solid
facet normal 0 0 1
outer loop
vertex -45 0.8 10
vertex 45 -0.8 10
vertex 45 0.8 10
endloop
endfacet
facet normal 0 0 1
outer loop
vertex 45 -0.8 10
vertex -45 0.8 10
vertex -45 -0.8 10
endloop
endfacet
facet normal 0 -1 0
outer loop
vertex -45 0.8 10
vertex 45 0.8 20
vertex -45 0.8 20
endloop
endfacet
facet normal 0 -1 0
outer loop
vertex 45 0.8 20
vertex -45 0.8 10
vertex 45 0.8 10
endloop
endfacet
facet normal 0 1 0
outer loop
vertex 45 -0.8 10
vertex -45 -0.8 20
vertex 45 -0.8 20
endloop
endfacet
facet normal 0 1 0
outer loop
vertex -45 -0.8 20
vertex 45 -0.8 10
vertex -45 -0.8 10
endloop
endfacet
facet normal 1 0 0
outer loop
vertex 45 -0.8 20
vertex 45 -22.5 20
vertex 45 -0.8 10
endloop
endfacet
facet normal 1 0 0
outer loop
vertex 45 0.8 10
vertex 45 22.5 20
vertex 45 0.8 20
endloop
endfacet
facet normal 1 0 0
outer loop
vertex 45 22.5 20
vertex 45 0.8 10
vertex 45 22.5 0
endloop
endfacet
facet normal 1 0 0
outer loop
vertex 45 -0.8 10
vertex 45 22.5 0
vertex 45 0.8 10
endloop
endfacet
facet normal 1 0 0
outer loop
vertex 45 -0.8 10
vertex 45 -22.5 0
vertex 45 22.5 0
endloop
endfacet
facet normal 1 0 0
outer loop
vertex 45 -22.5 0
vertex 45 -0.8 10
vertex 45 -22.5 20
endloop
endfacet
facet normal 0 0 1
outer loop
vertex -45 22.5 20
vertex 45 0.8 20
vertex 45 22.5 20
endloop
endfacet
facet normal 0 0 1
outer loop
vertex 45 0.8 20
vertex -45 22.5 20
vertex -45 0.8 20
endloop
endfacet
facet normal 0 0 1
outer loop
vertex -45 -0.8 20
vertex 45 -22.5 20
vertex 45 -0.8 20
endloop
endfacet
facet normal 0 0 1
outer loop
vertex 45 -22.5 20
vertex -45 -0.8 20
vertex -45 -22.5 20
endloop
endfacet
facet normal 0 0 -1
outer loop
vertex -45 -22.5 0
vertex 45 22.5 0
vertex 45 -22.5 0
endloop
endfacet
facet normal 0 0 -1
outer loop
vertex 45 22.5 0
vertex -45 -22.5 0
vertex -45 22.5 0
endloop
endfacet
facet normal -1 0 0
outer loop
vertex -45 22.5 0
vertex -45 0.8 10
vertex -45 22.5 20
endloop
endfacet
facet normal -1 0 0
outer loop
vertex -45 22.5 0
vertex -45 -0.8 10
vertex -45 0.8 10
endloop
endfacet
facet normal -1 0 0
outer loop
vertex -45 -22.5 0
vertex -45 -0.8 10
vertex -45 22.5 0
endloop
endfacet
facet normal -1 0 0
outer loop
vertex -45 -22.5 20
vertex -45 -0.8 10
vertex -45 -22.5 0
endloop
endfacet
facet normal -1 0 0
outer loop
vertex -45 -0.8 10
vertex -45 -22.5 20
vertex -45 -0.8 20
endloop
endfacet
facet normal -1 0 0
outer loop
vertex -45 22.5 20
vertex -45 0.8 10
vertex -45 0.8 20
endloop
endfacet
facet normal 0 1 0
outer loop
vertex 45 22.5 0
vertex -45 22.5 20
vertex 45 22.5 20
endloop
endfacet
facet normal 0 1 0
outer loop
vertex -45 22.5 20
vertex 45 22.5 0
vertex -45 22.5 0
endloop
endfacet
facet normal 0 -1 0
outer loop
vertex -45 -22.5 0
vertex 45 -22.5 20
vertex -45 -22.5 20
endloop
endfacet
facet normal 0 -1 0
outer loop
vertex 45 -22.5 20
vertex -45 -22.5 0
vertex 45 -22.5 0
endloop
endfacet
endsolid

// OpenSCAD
// Microscope slide drying rack
// Print orientation: base block on bed (z = 0), slots open upward (+Z)

// ---------------- Parameters ----------------
block_len    = 90;    // base block length along X (mm)
block_wid    = 45;    // base block width along Y (mm)
block_h      = 20;    // base block height along Z (mm)

slot_count   = 10;    // number of slide slots
slot_len     = 77;    // slot length along X (mm)
slot_w       = 1.6;   // slot width along Y (mm)
slot_depth   = 10;    // slot depth from top face (mm)
slot_pitch   = 3.5;   // centre-to-centre slot spacing along Y (mm)

eps          = 0.5;   // overshoot of cutters past the top face (mm)

$fn = 64;

// ---------------- Model ----------------
difference() {
    // Base block, centred in X and Y, resting on z = 0
    translate([-block_len/2, -block_wid/2, 0])
        cube([block_len, block_wid, block_h]);

    // Parallel slots running along X, centred as a group in X and Y
    for (i = [0 : slot_count - 1]) {
        x = (i - (slot_count - 1)/2) * slot_pitch;
        translate([x - slot_len/2, -slot_w/2, block_h - slot_depth])
            cube([slot_len, slot_w, slot_depth + eps]);
    }
}
